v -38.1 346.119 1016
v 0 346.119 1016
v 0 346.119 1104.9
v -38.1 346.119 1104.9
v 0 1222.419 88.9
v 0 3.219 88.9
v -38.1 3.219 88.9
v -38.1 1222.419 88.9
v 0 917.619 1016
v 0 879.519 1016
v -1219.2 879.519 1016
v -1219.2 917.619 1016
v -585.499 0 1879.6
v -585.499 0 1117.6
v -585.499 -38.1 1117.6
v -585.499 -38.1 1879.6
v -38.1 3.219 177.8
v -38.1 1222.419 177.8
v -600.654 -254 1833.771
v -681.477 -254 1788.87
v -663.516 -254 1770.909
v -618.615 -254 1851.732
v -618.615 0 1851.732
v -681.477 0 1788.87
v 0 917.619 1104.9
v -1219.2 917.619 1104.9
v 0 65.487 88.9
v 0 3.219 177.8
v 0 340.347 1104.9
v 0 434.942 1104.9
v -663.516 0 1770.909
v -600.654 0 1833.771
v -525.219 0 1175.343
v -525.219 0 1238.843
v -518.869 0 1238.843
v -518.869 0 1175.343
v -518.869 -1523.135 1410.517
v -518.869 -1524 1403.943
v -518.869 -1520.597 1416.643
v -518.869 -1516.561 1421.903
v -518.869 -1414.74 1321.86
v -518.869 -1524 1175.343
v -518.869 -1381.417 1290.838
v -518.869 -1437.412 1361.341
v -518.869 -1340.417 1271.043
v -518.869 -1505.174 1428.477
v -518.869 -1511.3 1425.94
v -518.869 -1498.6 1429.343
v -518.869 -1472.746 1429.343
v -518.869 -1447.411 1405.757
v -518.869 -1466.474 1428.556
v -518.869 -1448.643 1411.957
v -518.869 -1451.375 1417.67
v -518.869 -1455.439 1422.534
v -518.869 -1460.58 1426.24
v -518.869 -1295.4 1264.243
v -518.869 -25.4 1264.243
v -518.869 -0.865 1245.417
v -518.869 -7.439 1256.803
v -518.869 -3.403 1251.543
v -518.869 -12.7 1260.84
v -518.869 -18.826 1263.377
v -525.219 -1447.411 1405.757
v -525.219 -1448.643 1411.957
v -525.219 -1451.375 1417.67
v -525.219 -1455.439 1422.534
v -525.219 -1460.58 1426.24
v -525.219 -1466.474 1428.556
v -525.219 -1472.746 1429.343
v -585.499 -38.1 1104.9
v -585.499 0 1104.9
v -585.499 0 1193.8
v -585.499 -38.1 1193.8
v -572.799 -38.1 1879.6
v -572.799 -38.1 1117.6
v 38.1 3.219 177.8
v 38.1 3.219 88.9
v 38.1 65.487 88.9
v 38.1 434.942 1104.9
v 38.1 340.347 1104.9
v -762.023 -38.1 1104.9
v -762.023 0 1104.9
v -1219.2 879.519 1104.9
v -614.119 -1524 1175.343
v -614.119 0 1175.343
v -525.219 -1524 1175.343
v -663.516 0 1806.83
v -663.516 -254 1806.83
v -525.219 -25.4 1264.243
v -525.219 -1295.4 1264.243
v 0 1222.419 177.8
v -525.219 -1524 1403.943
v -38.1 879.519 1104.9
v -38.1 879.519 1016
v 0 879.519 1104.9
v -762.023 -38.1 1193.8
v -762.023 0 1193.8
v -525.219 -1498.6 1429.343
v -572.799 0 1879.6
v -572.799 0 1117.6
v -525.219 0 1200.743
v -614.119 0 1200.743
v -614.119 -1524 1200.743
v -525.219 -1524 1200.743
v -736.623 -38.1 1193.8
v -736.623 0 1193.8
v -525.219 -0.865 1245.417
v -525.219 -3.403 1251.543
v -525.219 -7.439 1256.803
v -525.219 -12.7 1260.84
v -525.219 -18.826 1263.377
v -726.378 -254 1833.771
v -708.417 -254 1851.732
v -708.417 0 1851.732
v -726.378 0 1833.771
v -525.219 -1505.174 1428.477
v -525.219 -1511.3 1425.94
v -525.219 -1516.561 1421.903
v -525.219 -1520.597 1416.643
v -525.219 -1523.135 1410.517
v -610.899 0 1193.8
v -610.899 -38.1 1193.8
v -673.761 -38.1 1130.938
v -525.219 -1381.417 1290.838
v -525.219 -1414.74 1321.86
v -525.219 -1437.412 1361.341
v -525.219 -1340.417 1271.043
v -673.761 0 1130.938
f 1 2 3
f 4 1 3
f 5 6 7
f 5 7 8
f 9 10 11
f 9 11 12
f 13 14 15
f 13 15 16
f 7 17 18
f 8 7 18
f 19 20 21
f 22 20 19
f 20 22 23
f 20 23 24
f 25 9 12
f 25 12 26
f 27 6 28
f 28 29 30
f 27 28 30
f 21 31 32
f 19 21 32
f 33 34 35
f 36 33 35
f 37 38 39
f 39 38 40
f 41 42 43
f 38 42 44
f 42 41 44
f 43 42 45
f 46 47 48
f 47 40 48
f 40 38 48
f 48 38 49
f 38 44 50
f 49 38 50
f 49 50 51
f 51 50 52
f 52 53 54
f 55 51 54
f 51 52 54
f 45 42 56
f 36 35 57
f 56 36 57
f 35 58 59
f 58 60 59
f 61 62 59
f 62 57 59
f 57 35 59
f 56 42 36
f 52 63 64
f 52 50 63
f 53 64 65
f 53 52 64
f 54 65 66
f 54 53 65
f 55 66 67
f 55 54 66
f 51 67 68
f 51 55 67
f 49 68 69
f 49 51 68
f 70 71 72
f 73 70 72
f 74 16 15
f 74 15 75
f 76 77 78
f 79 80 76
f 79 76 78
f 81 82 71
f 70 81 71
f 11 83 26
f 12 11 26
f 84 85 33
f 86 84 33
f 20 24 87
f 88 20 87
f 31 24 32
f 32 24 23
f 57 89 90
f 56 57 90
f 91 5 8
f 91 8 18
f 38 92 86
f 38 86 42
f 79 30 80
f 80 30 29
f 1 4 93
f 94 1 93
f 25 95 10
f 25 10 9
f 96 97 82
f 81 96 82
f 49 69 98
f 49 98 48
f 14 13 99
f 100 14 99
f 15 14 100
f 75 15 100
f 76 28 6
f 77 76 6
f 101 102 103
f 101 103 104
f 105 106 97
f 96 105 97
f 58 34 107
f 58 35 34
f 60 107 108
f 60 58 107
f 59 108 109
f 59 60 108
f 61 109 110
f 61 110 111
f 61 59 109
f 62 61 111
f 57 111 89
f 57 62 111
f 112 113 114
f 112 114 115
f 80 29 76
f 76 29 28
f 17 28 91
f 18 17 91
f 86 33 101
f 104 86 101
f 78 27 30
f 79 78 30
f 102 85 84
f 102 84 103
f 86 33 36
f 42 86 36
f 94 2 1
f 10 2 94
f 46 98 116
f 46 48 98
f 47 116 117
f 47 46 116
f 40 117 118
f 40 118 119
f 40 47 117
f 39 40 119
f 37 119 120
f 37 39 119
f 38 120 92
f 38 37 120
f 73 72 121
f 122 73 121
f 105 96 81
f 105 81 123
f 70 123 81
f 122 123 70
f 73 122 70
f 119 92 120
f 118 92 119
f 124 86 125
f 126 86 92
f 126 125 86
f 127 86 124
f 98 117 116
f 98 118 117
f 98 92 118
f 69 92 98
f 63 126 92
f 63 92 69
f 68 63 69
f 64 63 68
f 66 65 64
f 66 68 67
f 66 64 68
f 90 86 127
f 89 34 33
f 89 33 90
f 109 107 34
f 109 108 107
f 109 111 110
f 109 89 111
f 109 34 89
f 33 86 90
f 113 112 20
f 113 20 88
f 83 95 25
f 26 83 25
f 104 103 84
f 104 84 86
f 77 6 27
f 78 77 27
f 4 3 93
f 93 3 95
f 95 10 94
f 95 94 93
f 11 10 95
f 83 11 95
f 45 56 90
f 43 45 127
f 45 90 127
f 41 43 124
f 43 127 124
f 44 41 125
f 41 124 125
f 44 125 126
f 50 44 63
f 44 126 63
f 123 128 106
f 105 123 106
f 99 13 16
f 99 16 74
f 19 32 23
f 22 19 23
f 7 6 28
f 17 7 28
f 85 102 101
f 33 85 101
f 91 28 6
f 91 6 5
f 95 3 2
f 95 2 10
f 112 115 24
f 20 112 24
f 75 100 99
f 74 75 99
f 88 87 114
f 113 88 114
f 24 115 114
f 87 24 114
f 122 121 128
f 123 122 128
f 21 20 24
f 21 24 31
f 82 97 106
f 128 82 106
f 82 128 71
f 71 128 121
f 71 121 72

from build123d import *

# Parameters (mm, degrees)
F3_W      = 533.4
F3_H      = 88.9
F4_DEPTH  = 38.1
F5_W      = 38.1
F5_H      = 88.9
F6_DEPTH  = 1219.2
F8_DEPTH  = 38.1
F9_W      = 1219.2
F9_H      = 88.9
F10_DEPTH = 38.1
F11_W     = 88.9
F11_H     = 25.4
F12_DEPTH = 1524
F13_W     = 6.35
F13_H     = 254
F14_DEPTH = 1524
F16_DEPTH = 25.4
F17_R     = 25.4
F20_DEPTH = 254
F22_DEPTH = 254
F24_DEPTH = 38.1
F25_W     = 12.7
F25_H     = 762
F26_DEPTH = 38.1


with BuildPart() as f4:
    # F3 (on Right) → F4 (new body)
    with BuildSketch(Plane.YZ):
        with Locations((612.819310236, 1060.45)):
            Rectangle(F3_W, F3_H)
    extrude(amount=-F4_DEPTH)


with BuildPart() as f6:
    # F5 (on Right) → F6 (new body)
    with BuildSketch(Plane.YZ):
        with Locations((898.569310236, 1060.45)):
            Rectangle(F5_W, F5_H)
    extrude(amount=-F6_DEPTH)


with BuildPart() as f8:
    # F7 (on Right) → F8 (new body)
    with BuildSketch(Plane.YZ):
        Polygon((65.4872940599, 88.9), (434.9418395144, 1104.9), (340.3465829632, 1104.9), (3.219310236, 177.8), (3.219310236, 88.9), align=None)
    extrude(amount=F8_DEPTH)


with BuildPart() as f10:
    # F9 (on Right) → F10 (new body)
    with BuildSketch(Plane.YZ):
        with Locations((612.819310236, 133.35)):
            Rectangle(F9_W, F9_H)
    extrude(amount=-F10_DEPTH)


with BuildPart() as f12:
    # F11 (on Front) → F12 (new body)
    with BuildSketch(Plane.XZ):
        with Locations((-569.6693211794, 1188.0428296248)):
            Rectangle(F11_W, F11_H)
    extrude(amount=F12_DEPTH)


with BuildPart() as f14:
    # F13 (on Front) → F14 (new body)
    with BuildSketch(Plane.XZ):
        with Locations((-522.0443211794, 1302.3428296248)):
            Rectangle(F13_W, F13_H)
    extrude(amount=F14_DEPTH)

    # F15 (on face) → F16 (cut)
    with BuildSketch(Plane(origin=(-525.2193211794, 0, 0), x_dir=(0, -1, 0), z_dir=(-1, 0, 0))):
        with BuildLine():
            Line((1447.8, 1429.3428296248), (0, 1429.3428296248))
            Line((0, 1429.3428296248), (0, 1264.2428296248))
            Line((0, 1264.2428296248), (1295.4, 1264.2428296248))
            ThreePointArc((1295.4, 1264.2428296248), (1403.1630734528, 1308.879756172), (1447.8, 1416.6428296248))
            Line((1447.8, 1416.6428296248), (1447.8, 1429.3428296248))
        make_face()
    extrude(amount=-F16_DEPTH, mode=Mode.SUBTRACT)

    # F17
    f17_edges = [f14.edges().sort_by_distance(p)[0] for p in [
        (-522.044321, 0, 1264.24283),
        (-522.044321, -1447.8, 1429.34283),
        (-522.044321, -1524, 1429.34283),
    ]]
    fillet(f17_edges, radius=F17_R)


with BuildPart() as f20:
    # F19 (on Front) → F20 (new body)
    with BuildSketch(Plane.XZ):
        Polygon((-708.4172691947, 1851.7317339102), (-726.3777814369, 1833.7712216681), (-681.4765008315, 1788.8699410628), (-663.5159885894, 1806.8304533049), align=None)
    extrude(amount=F20_DEPTH)


with BuildPart() as f22:
    # F21 (on Front) → F22 (new body)
    with BuildSketch(Plane.XZ):
        Polygon((-681.4765008315, 1788.8699410628), (-663.5159885894, 1770.9094288206), (-600.6541957419, 1833.7712216681), (-618.614707984, 1851.7317339102), align=None)
    extrude(amount=F22_DEPTH)


with BuildPart() as f24:
    # F23 (on face) → F24 (new body)
    with BuildSketch(Plane.XZ):
        Polygon((-736.6227434128, 1193.8), (-762.0227434128, 1193.8), (-762.0227434128, 1104.9), (-585.4991577179, 1104.9), (-585.4991577179, 1193.8), (-610.8991577179, 1193.8), (-673.7609505653, 1130.9382071525), align=None)
    extrude(amount=F24_DEPTH)


with BuildPart() as f26:
    # F25 (on face) → F26 (new body)
    with BuildSketch(Plane.XZ):
        with Locations((-579.1491577179, 1498.6)):
            Rectangle(F25_W, F25_H)
    extrude(amount=F26_DEPTH)


solid = Compound([f4.part, f6.part, f8.part, f10.part, f12.part, f14.part, f20.part, f22.part, f24.part, f26.part])
